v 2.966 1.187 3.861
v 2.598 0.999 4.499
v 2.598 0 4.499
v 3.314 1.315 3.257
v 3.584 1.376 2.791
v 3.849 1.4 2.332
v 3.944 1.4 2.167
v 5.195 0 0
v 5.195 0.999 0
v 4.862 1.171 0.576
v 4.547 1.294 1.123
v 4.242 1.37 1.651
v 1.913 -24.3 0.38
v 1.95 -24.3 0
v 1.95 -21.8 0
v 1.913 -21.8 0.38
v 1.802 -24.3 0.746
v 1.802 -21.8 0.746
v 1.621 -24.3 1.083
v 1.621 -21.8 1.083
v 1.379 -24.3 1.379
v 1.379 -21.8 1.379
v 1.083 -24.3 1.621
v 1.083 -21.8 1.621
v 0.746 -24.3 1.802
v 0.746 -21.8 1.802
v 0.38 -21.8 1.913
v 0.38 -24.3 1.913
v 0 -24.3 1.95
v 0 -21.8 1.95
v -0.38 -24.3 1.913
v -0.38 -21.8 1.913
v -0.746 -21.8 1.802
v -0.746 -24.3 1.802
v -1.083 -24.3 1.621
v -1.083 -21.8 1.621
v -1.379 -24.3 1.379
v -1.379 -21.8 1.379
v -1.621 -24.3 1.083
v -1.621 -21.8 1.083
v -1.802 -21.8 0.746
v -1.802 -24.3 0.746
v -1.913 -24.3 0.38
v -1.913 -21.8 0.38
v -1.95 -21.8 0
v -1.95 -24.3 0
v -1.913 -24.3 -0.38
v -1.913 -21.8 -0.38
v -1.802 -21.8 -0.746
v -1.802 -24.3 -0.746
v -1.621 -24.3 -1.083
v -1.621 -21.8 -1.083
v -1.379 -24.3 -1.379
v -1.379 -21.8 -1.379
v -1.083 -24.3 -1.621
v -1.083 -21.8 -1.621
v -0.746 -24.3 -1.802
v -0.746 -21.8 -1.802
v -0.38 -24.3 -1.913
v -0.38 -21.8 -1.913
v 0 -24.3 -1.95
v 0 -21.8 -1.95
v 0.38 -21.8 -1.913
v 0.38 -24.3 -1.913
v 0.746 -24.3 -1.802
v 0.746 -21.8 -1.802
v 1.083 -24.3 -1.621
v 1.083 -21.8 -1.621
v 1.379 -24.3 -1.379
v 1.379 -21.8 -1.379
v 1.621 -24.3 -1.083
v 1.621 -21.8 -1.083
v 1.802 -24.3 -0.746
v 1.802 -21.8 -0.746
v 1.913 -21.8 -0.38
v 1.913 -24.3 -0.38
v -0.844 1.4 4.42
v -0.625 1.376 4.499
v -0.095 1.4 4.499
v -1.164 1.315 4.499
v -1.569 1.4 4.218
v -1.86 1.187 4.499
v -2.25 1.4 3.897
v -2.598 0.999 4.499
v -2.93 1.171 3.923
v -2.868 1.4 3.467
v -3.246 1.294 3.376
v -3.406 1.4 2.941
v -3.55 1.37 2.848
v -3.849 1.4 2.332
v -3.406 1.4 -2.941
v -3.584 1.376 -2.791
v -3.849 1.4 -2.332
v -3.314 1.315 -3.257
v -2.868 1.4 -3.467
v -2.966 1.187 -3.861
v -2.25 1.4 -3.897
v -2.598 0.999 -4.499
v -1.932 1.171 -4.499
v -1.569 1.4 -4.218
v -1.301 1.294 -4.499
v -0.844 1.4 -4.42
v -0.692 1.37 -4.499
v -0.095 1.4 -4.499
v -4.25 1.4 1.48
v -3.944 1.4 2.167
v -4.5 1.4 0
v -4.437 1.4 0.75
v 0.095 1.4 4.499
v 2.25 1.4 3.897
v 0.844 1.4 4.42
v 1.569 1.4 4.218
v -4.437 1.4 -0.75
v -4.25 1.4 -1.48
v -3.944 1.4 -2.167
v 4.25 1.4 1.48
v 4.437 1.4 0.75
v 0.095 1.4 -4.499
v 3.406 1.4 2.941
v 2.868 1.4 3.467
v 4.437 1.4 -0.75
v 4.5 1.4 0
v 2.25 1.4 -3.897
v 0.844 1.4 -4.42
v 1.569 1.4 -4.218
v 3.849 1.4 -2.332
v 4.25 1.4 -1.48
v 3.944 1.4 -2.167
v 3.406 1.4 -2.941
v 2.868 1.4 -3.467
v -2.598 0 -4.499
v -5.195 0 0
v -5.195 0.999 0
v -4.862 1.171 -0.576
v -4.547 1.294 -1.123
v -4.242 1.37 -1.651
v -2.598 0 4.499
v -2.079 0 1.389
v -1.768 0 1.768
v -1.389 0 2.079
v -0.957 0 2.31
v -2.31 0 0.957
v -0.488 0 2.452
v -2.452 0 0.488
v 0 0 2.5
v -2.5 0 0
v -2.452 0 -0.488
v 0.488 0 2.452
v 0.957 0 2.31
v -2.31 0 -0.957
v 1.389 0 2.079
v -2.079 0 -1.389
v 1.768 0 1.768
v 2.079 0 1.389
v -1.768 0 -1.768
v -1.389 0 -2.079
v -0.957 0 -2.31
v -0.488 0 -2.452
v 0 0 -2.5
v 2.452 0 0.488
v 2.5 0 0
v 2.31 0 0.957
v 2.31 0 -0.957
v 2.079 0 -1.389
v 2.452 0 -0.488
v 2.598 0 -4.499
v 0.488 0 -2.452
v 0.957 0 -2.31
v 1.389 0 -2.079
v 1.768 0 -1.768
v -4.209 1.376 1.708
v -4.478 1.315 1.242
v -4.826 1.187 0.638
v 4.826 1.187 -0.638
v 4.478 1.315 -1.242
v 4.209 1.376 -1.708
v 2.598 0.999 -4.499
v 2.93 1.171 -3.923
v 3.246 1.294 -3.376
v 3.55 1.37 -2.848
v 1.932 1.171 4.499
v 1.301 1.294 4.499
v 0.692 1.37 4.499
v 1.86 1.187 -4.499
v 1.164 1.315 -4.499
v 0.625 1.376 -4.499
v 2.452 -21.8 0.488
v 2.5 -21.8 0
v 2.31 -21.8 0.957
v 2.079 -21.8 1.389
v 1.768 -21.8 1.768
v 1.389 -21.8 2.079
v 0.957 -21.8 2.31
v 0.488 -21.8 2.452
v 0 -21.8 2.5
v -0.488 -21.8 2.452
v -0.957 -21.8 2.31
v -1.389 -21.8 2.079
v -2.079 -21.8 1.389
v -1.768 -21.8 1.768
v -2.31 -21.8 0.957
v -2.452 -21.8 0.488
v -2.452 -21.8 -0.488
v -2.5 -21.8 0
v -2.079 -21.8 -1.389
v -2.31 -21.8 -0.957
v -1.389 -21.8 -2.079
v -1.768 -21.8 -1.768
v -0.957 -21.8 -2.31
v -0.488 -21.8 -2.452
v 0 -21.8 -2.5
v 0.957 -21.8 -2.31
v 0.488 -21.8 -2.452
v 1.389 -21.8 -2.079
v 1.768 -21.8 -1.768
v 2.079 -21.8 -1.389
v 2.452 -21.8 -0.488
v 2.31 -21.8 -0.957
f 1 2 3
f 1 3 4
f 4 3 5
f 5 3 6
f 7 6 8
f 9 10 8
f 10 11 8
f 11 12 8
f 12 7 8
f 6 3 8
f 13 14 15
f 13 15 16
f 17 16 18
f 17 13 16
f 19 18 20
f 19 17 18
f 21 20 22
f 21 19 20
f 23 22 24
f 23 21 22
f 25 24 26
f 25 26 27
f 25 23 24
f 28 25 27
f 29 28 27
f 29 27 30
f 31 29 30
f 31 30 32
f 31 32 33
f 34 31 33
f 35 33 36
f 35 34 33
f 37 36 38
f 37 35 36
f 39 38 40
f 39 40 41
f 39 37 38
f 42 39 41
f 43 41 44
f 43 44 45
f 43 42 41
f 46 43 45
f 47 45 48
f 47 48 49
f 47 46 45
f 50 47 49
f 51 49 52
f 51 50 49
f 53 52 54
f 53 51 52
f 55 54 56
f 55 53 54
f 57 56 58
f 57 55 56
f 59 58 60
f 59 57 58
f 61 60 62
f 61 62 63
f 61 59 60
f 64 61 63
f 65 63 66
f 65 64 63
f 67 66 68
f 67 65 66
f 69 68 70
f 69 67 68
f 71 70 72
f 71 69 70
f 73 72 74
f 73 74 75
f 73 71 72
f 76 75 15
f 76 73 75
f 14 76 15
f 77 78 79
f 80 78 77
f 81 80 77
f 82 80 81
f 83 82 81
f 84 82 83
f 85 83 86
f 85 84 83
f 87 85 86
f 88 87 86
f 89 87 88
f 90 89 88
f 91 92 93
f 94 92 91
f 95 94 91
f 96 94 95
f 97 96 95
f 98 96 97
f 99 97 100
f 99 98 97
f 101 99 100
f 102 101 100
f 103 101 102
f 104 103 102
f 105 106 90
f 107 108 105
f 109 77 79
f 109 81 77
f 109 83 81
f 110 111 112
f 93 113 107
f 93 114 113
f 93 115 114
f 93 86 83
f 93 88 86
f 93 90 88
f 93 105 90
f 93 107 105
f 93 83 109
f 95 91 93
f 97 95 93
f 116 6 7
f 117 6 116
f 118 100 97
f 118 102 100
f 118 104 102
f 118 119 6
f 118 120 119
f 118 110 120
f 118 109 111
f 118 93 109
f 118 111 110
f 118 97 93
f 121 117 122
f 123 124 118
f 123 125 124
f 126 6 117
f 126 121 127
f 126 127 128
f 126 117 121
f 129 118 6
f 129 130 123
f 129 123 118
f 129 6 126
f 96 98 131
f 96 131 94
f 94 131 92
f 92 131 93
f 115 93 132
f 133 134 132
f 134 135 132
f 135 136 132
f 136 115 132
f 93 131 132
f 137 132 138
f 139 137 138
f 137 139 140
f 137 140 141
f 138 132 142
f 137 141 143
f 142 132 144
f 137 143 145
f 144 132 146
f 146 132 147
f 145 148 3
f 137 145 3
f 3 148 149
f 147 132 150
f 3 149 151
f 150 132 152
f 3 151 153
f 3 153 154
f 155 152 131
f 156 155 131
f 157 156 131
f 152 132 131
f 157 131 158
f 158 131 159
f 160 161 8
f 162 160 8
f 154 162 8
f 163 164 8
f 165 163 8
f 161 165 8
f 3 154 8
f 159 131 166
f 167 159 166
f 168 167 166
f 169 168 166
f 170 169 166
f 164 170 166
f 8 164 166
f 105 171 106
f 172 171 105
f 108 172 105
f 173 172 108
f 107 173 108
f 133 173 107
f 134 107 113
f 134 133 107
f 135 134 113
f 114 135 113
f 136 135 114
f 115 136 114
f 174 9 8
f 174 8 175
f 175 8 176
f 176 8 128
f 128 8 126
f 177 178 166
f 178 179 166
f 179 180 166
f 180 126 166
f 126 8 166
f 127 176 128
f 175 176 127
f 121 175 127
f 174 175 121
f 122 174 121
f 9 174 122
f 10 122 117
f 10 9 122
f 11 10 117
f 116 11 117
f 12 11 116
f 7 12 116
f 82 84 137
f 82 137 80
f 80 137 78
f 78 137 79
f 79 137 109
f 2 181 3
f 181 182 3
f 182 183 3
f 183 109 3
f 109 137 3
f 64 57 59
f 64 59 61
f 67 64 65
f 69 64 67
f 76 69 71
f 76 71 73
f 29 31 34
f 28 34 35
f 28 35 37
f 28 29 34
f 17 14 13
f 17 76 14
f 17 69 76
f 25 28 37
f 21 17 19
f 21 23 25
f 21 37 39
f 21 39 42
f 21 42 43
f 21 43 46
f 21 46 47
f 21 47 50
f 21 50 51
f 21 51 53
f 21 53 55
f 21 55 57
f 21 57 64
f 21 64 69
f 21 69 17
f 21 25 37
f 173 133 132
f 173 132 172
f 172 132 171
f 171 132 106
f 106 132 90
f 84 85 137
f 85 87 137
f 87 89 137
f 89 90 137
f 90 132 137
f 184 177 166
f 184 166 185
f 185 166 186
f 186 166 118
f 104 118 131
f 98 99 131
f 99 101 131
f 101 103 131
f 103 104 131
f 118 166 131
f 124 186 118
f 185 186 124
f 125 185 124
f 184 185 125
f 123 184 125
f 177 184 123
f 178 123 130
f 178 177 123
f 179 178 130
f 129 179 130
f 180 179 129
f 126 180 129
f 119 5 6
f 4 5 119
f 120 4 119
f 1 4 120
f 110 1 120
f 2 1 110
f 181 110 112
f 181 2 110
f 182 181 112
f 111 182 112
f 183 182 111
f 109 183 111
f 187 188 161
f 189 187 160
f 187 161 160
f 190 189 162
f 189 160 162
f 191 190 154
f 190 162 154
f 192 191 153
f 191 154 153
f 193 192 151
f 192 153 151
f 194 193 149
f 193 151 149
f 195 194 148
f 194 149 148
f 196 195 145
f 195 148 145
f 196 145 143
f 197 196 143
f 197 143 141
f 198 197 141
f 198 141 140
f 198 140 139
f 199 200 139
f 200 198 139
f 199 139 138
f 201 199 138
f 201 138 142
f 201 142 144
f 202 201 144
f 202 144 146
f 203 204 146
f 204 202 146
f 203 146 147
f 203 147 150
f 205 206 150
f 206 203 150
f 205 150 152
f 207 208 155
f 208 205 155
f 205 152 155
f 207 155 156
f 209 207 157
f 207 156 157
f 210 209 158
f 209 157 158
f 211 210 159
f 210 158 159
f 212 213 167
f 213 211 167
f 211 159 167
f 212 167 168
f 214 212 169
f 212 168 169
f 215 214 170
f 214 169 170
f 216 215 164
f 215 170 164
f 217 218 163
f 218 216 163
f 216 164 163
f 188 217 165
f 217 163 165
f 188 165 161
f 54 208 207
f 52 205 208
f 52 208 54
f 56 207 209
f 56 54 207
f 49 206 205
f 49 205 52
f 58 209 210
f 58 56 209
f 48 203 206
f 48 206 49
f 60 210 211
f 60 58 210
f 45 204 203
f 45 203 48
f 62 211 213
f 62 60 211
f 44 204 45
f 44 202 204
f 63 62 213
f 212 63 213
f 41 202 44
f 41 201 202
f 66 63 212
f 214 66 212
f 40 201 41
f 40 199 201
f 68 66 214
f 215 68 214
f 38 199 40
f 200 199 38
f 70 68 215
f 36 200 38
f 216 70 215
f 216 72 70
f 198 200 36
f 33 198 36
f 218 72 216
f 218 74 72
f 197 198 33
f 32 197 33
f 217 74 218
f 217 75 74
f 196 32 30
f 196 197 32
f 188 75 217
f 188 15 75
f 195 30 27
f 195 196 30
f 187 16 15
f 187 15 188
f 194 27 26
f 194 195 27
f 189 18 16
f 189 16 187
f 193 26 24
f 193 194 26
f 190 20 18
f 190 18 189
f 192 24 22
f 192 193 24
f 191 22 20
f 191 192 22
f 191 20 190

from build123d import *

# Parameters (mm, degrees)
BOSS_EXTRUDE1_DEPTH = 1.4
SKETCH2_OUTSIDE_W   = 18.618
SKETCH2_OUTSIDE_H   = 17.226
SKETCH2_OUTSIDE_R   = 4.5
CUT_EXTRUDE1_DEPTH  = 1
CUT_EXTRUDE1_TAPER  = 60
SKETCH3_R           = 2.5
BOSS_EXTRUDE2_DEPTH = 24.3
SKETCH4_OUTSIDE_W   = 18.218
SKETCH4_OUTSIDE_H   = 16.826
SKETCH4_OUTSIDE_R   = 1.95
CUT_EXTRUDE2_DEPTH  = 2.5


with BuildPart() as part:
    # Sketch1 → Boss-Extrude1 (new body)
    with BuildSketch(Plane(origin=(0, 0, 0), x_dir=(1, 0, 0), z_dir=(0, 1, 0))):
        Polygon((5.195, 0), (2.5975, 4.499001973), (-2.5975, 4.499001973), (-5.195, 0), (-2.5975, -4.499001973), (2.5975, -4.499001973), align=None)
    extrude(amount=BOSS_EXTRUDE1_DEPTH)

    # Sketch2 outside → Cut-Extrude1 (cut)
    with BuildSketch(Plane(origin=(0, 1.4, 0), x_dir=(1, 0, 0), z_dir=(0, 1, 0))):
        Rectangle(SKETCH2_OUTSIDE_W, SKETCH2_OUTSIDE_H)
        Circle(SKETCH2_OUTSIDE_R, mode=Mode.SUBTRACT)
    extrude(amount=-CUT_EXTRUDE1_DEPTH, taper=CUT_EXTRUDE1_TAPER, mode=Mode.SUBTRACT)

    # Sketch3 → Boss-Extrude2 (add)
    with BuildSketch(Plane.XZ):
        Circle(SKETCH3_R)
    extrude(amount=BOSS_EXTRUDE2_DEPTH)

    # Sketch4 outside → Cut-Extrude2 (cut)
    with BuildSketch(Plane.XZ.offset(24.3)):
        Rectangle(SKETCH4_OUTSIDE_W, SKETCH4_OUTSIDE_H)
        Circle(SKETCH4_OUTSIDE_R, mode=Mode.SUBTRACT)
    extrude(amount=-CUT_EXTRUDE2_DEPTH, mode=Mode.SUBTRACT)


solid = part.part
